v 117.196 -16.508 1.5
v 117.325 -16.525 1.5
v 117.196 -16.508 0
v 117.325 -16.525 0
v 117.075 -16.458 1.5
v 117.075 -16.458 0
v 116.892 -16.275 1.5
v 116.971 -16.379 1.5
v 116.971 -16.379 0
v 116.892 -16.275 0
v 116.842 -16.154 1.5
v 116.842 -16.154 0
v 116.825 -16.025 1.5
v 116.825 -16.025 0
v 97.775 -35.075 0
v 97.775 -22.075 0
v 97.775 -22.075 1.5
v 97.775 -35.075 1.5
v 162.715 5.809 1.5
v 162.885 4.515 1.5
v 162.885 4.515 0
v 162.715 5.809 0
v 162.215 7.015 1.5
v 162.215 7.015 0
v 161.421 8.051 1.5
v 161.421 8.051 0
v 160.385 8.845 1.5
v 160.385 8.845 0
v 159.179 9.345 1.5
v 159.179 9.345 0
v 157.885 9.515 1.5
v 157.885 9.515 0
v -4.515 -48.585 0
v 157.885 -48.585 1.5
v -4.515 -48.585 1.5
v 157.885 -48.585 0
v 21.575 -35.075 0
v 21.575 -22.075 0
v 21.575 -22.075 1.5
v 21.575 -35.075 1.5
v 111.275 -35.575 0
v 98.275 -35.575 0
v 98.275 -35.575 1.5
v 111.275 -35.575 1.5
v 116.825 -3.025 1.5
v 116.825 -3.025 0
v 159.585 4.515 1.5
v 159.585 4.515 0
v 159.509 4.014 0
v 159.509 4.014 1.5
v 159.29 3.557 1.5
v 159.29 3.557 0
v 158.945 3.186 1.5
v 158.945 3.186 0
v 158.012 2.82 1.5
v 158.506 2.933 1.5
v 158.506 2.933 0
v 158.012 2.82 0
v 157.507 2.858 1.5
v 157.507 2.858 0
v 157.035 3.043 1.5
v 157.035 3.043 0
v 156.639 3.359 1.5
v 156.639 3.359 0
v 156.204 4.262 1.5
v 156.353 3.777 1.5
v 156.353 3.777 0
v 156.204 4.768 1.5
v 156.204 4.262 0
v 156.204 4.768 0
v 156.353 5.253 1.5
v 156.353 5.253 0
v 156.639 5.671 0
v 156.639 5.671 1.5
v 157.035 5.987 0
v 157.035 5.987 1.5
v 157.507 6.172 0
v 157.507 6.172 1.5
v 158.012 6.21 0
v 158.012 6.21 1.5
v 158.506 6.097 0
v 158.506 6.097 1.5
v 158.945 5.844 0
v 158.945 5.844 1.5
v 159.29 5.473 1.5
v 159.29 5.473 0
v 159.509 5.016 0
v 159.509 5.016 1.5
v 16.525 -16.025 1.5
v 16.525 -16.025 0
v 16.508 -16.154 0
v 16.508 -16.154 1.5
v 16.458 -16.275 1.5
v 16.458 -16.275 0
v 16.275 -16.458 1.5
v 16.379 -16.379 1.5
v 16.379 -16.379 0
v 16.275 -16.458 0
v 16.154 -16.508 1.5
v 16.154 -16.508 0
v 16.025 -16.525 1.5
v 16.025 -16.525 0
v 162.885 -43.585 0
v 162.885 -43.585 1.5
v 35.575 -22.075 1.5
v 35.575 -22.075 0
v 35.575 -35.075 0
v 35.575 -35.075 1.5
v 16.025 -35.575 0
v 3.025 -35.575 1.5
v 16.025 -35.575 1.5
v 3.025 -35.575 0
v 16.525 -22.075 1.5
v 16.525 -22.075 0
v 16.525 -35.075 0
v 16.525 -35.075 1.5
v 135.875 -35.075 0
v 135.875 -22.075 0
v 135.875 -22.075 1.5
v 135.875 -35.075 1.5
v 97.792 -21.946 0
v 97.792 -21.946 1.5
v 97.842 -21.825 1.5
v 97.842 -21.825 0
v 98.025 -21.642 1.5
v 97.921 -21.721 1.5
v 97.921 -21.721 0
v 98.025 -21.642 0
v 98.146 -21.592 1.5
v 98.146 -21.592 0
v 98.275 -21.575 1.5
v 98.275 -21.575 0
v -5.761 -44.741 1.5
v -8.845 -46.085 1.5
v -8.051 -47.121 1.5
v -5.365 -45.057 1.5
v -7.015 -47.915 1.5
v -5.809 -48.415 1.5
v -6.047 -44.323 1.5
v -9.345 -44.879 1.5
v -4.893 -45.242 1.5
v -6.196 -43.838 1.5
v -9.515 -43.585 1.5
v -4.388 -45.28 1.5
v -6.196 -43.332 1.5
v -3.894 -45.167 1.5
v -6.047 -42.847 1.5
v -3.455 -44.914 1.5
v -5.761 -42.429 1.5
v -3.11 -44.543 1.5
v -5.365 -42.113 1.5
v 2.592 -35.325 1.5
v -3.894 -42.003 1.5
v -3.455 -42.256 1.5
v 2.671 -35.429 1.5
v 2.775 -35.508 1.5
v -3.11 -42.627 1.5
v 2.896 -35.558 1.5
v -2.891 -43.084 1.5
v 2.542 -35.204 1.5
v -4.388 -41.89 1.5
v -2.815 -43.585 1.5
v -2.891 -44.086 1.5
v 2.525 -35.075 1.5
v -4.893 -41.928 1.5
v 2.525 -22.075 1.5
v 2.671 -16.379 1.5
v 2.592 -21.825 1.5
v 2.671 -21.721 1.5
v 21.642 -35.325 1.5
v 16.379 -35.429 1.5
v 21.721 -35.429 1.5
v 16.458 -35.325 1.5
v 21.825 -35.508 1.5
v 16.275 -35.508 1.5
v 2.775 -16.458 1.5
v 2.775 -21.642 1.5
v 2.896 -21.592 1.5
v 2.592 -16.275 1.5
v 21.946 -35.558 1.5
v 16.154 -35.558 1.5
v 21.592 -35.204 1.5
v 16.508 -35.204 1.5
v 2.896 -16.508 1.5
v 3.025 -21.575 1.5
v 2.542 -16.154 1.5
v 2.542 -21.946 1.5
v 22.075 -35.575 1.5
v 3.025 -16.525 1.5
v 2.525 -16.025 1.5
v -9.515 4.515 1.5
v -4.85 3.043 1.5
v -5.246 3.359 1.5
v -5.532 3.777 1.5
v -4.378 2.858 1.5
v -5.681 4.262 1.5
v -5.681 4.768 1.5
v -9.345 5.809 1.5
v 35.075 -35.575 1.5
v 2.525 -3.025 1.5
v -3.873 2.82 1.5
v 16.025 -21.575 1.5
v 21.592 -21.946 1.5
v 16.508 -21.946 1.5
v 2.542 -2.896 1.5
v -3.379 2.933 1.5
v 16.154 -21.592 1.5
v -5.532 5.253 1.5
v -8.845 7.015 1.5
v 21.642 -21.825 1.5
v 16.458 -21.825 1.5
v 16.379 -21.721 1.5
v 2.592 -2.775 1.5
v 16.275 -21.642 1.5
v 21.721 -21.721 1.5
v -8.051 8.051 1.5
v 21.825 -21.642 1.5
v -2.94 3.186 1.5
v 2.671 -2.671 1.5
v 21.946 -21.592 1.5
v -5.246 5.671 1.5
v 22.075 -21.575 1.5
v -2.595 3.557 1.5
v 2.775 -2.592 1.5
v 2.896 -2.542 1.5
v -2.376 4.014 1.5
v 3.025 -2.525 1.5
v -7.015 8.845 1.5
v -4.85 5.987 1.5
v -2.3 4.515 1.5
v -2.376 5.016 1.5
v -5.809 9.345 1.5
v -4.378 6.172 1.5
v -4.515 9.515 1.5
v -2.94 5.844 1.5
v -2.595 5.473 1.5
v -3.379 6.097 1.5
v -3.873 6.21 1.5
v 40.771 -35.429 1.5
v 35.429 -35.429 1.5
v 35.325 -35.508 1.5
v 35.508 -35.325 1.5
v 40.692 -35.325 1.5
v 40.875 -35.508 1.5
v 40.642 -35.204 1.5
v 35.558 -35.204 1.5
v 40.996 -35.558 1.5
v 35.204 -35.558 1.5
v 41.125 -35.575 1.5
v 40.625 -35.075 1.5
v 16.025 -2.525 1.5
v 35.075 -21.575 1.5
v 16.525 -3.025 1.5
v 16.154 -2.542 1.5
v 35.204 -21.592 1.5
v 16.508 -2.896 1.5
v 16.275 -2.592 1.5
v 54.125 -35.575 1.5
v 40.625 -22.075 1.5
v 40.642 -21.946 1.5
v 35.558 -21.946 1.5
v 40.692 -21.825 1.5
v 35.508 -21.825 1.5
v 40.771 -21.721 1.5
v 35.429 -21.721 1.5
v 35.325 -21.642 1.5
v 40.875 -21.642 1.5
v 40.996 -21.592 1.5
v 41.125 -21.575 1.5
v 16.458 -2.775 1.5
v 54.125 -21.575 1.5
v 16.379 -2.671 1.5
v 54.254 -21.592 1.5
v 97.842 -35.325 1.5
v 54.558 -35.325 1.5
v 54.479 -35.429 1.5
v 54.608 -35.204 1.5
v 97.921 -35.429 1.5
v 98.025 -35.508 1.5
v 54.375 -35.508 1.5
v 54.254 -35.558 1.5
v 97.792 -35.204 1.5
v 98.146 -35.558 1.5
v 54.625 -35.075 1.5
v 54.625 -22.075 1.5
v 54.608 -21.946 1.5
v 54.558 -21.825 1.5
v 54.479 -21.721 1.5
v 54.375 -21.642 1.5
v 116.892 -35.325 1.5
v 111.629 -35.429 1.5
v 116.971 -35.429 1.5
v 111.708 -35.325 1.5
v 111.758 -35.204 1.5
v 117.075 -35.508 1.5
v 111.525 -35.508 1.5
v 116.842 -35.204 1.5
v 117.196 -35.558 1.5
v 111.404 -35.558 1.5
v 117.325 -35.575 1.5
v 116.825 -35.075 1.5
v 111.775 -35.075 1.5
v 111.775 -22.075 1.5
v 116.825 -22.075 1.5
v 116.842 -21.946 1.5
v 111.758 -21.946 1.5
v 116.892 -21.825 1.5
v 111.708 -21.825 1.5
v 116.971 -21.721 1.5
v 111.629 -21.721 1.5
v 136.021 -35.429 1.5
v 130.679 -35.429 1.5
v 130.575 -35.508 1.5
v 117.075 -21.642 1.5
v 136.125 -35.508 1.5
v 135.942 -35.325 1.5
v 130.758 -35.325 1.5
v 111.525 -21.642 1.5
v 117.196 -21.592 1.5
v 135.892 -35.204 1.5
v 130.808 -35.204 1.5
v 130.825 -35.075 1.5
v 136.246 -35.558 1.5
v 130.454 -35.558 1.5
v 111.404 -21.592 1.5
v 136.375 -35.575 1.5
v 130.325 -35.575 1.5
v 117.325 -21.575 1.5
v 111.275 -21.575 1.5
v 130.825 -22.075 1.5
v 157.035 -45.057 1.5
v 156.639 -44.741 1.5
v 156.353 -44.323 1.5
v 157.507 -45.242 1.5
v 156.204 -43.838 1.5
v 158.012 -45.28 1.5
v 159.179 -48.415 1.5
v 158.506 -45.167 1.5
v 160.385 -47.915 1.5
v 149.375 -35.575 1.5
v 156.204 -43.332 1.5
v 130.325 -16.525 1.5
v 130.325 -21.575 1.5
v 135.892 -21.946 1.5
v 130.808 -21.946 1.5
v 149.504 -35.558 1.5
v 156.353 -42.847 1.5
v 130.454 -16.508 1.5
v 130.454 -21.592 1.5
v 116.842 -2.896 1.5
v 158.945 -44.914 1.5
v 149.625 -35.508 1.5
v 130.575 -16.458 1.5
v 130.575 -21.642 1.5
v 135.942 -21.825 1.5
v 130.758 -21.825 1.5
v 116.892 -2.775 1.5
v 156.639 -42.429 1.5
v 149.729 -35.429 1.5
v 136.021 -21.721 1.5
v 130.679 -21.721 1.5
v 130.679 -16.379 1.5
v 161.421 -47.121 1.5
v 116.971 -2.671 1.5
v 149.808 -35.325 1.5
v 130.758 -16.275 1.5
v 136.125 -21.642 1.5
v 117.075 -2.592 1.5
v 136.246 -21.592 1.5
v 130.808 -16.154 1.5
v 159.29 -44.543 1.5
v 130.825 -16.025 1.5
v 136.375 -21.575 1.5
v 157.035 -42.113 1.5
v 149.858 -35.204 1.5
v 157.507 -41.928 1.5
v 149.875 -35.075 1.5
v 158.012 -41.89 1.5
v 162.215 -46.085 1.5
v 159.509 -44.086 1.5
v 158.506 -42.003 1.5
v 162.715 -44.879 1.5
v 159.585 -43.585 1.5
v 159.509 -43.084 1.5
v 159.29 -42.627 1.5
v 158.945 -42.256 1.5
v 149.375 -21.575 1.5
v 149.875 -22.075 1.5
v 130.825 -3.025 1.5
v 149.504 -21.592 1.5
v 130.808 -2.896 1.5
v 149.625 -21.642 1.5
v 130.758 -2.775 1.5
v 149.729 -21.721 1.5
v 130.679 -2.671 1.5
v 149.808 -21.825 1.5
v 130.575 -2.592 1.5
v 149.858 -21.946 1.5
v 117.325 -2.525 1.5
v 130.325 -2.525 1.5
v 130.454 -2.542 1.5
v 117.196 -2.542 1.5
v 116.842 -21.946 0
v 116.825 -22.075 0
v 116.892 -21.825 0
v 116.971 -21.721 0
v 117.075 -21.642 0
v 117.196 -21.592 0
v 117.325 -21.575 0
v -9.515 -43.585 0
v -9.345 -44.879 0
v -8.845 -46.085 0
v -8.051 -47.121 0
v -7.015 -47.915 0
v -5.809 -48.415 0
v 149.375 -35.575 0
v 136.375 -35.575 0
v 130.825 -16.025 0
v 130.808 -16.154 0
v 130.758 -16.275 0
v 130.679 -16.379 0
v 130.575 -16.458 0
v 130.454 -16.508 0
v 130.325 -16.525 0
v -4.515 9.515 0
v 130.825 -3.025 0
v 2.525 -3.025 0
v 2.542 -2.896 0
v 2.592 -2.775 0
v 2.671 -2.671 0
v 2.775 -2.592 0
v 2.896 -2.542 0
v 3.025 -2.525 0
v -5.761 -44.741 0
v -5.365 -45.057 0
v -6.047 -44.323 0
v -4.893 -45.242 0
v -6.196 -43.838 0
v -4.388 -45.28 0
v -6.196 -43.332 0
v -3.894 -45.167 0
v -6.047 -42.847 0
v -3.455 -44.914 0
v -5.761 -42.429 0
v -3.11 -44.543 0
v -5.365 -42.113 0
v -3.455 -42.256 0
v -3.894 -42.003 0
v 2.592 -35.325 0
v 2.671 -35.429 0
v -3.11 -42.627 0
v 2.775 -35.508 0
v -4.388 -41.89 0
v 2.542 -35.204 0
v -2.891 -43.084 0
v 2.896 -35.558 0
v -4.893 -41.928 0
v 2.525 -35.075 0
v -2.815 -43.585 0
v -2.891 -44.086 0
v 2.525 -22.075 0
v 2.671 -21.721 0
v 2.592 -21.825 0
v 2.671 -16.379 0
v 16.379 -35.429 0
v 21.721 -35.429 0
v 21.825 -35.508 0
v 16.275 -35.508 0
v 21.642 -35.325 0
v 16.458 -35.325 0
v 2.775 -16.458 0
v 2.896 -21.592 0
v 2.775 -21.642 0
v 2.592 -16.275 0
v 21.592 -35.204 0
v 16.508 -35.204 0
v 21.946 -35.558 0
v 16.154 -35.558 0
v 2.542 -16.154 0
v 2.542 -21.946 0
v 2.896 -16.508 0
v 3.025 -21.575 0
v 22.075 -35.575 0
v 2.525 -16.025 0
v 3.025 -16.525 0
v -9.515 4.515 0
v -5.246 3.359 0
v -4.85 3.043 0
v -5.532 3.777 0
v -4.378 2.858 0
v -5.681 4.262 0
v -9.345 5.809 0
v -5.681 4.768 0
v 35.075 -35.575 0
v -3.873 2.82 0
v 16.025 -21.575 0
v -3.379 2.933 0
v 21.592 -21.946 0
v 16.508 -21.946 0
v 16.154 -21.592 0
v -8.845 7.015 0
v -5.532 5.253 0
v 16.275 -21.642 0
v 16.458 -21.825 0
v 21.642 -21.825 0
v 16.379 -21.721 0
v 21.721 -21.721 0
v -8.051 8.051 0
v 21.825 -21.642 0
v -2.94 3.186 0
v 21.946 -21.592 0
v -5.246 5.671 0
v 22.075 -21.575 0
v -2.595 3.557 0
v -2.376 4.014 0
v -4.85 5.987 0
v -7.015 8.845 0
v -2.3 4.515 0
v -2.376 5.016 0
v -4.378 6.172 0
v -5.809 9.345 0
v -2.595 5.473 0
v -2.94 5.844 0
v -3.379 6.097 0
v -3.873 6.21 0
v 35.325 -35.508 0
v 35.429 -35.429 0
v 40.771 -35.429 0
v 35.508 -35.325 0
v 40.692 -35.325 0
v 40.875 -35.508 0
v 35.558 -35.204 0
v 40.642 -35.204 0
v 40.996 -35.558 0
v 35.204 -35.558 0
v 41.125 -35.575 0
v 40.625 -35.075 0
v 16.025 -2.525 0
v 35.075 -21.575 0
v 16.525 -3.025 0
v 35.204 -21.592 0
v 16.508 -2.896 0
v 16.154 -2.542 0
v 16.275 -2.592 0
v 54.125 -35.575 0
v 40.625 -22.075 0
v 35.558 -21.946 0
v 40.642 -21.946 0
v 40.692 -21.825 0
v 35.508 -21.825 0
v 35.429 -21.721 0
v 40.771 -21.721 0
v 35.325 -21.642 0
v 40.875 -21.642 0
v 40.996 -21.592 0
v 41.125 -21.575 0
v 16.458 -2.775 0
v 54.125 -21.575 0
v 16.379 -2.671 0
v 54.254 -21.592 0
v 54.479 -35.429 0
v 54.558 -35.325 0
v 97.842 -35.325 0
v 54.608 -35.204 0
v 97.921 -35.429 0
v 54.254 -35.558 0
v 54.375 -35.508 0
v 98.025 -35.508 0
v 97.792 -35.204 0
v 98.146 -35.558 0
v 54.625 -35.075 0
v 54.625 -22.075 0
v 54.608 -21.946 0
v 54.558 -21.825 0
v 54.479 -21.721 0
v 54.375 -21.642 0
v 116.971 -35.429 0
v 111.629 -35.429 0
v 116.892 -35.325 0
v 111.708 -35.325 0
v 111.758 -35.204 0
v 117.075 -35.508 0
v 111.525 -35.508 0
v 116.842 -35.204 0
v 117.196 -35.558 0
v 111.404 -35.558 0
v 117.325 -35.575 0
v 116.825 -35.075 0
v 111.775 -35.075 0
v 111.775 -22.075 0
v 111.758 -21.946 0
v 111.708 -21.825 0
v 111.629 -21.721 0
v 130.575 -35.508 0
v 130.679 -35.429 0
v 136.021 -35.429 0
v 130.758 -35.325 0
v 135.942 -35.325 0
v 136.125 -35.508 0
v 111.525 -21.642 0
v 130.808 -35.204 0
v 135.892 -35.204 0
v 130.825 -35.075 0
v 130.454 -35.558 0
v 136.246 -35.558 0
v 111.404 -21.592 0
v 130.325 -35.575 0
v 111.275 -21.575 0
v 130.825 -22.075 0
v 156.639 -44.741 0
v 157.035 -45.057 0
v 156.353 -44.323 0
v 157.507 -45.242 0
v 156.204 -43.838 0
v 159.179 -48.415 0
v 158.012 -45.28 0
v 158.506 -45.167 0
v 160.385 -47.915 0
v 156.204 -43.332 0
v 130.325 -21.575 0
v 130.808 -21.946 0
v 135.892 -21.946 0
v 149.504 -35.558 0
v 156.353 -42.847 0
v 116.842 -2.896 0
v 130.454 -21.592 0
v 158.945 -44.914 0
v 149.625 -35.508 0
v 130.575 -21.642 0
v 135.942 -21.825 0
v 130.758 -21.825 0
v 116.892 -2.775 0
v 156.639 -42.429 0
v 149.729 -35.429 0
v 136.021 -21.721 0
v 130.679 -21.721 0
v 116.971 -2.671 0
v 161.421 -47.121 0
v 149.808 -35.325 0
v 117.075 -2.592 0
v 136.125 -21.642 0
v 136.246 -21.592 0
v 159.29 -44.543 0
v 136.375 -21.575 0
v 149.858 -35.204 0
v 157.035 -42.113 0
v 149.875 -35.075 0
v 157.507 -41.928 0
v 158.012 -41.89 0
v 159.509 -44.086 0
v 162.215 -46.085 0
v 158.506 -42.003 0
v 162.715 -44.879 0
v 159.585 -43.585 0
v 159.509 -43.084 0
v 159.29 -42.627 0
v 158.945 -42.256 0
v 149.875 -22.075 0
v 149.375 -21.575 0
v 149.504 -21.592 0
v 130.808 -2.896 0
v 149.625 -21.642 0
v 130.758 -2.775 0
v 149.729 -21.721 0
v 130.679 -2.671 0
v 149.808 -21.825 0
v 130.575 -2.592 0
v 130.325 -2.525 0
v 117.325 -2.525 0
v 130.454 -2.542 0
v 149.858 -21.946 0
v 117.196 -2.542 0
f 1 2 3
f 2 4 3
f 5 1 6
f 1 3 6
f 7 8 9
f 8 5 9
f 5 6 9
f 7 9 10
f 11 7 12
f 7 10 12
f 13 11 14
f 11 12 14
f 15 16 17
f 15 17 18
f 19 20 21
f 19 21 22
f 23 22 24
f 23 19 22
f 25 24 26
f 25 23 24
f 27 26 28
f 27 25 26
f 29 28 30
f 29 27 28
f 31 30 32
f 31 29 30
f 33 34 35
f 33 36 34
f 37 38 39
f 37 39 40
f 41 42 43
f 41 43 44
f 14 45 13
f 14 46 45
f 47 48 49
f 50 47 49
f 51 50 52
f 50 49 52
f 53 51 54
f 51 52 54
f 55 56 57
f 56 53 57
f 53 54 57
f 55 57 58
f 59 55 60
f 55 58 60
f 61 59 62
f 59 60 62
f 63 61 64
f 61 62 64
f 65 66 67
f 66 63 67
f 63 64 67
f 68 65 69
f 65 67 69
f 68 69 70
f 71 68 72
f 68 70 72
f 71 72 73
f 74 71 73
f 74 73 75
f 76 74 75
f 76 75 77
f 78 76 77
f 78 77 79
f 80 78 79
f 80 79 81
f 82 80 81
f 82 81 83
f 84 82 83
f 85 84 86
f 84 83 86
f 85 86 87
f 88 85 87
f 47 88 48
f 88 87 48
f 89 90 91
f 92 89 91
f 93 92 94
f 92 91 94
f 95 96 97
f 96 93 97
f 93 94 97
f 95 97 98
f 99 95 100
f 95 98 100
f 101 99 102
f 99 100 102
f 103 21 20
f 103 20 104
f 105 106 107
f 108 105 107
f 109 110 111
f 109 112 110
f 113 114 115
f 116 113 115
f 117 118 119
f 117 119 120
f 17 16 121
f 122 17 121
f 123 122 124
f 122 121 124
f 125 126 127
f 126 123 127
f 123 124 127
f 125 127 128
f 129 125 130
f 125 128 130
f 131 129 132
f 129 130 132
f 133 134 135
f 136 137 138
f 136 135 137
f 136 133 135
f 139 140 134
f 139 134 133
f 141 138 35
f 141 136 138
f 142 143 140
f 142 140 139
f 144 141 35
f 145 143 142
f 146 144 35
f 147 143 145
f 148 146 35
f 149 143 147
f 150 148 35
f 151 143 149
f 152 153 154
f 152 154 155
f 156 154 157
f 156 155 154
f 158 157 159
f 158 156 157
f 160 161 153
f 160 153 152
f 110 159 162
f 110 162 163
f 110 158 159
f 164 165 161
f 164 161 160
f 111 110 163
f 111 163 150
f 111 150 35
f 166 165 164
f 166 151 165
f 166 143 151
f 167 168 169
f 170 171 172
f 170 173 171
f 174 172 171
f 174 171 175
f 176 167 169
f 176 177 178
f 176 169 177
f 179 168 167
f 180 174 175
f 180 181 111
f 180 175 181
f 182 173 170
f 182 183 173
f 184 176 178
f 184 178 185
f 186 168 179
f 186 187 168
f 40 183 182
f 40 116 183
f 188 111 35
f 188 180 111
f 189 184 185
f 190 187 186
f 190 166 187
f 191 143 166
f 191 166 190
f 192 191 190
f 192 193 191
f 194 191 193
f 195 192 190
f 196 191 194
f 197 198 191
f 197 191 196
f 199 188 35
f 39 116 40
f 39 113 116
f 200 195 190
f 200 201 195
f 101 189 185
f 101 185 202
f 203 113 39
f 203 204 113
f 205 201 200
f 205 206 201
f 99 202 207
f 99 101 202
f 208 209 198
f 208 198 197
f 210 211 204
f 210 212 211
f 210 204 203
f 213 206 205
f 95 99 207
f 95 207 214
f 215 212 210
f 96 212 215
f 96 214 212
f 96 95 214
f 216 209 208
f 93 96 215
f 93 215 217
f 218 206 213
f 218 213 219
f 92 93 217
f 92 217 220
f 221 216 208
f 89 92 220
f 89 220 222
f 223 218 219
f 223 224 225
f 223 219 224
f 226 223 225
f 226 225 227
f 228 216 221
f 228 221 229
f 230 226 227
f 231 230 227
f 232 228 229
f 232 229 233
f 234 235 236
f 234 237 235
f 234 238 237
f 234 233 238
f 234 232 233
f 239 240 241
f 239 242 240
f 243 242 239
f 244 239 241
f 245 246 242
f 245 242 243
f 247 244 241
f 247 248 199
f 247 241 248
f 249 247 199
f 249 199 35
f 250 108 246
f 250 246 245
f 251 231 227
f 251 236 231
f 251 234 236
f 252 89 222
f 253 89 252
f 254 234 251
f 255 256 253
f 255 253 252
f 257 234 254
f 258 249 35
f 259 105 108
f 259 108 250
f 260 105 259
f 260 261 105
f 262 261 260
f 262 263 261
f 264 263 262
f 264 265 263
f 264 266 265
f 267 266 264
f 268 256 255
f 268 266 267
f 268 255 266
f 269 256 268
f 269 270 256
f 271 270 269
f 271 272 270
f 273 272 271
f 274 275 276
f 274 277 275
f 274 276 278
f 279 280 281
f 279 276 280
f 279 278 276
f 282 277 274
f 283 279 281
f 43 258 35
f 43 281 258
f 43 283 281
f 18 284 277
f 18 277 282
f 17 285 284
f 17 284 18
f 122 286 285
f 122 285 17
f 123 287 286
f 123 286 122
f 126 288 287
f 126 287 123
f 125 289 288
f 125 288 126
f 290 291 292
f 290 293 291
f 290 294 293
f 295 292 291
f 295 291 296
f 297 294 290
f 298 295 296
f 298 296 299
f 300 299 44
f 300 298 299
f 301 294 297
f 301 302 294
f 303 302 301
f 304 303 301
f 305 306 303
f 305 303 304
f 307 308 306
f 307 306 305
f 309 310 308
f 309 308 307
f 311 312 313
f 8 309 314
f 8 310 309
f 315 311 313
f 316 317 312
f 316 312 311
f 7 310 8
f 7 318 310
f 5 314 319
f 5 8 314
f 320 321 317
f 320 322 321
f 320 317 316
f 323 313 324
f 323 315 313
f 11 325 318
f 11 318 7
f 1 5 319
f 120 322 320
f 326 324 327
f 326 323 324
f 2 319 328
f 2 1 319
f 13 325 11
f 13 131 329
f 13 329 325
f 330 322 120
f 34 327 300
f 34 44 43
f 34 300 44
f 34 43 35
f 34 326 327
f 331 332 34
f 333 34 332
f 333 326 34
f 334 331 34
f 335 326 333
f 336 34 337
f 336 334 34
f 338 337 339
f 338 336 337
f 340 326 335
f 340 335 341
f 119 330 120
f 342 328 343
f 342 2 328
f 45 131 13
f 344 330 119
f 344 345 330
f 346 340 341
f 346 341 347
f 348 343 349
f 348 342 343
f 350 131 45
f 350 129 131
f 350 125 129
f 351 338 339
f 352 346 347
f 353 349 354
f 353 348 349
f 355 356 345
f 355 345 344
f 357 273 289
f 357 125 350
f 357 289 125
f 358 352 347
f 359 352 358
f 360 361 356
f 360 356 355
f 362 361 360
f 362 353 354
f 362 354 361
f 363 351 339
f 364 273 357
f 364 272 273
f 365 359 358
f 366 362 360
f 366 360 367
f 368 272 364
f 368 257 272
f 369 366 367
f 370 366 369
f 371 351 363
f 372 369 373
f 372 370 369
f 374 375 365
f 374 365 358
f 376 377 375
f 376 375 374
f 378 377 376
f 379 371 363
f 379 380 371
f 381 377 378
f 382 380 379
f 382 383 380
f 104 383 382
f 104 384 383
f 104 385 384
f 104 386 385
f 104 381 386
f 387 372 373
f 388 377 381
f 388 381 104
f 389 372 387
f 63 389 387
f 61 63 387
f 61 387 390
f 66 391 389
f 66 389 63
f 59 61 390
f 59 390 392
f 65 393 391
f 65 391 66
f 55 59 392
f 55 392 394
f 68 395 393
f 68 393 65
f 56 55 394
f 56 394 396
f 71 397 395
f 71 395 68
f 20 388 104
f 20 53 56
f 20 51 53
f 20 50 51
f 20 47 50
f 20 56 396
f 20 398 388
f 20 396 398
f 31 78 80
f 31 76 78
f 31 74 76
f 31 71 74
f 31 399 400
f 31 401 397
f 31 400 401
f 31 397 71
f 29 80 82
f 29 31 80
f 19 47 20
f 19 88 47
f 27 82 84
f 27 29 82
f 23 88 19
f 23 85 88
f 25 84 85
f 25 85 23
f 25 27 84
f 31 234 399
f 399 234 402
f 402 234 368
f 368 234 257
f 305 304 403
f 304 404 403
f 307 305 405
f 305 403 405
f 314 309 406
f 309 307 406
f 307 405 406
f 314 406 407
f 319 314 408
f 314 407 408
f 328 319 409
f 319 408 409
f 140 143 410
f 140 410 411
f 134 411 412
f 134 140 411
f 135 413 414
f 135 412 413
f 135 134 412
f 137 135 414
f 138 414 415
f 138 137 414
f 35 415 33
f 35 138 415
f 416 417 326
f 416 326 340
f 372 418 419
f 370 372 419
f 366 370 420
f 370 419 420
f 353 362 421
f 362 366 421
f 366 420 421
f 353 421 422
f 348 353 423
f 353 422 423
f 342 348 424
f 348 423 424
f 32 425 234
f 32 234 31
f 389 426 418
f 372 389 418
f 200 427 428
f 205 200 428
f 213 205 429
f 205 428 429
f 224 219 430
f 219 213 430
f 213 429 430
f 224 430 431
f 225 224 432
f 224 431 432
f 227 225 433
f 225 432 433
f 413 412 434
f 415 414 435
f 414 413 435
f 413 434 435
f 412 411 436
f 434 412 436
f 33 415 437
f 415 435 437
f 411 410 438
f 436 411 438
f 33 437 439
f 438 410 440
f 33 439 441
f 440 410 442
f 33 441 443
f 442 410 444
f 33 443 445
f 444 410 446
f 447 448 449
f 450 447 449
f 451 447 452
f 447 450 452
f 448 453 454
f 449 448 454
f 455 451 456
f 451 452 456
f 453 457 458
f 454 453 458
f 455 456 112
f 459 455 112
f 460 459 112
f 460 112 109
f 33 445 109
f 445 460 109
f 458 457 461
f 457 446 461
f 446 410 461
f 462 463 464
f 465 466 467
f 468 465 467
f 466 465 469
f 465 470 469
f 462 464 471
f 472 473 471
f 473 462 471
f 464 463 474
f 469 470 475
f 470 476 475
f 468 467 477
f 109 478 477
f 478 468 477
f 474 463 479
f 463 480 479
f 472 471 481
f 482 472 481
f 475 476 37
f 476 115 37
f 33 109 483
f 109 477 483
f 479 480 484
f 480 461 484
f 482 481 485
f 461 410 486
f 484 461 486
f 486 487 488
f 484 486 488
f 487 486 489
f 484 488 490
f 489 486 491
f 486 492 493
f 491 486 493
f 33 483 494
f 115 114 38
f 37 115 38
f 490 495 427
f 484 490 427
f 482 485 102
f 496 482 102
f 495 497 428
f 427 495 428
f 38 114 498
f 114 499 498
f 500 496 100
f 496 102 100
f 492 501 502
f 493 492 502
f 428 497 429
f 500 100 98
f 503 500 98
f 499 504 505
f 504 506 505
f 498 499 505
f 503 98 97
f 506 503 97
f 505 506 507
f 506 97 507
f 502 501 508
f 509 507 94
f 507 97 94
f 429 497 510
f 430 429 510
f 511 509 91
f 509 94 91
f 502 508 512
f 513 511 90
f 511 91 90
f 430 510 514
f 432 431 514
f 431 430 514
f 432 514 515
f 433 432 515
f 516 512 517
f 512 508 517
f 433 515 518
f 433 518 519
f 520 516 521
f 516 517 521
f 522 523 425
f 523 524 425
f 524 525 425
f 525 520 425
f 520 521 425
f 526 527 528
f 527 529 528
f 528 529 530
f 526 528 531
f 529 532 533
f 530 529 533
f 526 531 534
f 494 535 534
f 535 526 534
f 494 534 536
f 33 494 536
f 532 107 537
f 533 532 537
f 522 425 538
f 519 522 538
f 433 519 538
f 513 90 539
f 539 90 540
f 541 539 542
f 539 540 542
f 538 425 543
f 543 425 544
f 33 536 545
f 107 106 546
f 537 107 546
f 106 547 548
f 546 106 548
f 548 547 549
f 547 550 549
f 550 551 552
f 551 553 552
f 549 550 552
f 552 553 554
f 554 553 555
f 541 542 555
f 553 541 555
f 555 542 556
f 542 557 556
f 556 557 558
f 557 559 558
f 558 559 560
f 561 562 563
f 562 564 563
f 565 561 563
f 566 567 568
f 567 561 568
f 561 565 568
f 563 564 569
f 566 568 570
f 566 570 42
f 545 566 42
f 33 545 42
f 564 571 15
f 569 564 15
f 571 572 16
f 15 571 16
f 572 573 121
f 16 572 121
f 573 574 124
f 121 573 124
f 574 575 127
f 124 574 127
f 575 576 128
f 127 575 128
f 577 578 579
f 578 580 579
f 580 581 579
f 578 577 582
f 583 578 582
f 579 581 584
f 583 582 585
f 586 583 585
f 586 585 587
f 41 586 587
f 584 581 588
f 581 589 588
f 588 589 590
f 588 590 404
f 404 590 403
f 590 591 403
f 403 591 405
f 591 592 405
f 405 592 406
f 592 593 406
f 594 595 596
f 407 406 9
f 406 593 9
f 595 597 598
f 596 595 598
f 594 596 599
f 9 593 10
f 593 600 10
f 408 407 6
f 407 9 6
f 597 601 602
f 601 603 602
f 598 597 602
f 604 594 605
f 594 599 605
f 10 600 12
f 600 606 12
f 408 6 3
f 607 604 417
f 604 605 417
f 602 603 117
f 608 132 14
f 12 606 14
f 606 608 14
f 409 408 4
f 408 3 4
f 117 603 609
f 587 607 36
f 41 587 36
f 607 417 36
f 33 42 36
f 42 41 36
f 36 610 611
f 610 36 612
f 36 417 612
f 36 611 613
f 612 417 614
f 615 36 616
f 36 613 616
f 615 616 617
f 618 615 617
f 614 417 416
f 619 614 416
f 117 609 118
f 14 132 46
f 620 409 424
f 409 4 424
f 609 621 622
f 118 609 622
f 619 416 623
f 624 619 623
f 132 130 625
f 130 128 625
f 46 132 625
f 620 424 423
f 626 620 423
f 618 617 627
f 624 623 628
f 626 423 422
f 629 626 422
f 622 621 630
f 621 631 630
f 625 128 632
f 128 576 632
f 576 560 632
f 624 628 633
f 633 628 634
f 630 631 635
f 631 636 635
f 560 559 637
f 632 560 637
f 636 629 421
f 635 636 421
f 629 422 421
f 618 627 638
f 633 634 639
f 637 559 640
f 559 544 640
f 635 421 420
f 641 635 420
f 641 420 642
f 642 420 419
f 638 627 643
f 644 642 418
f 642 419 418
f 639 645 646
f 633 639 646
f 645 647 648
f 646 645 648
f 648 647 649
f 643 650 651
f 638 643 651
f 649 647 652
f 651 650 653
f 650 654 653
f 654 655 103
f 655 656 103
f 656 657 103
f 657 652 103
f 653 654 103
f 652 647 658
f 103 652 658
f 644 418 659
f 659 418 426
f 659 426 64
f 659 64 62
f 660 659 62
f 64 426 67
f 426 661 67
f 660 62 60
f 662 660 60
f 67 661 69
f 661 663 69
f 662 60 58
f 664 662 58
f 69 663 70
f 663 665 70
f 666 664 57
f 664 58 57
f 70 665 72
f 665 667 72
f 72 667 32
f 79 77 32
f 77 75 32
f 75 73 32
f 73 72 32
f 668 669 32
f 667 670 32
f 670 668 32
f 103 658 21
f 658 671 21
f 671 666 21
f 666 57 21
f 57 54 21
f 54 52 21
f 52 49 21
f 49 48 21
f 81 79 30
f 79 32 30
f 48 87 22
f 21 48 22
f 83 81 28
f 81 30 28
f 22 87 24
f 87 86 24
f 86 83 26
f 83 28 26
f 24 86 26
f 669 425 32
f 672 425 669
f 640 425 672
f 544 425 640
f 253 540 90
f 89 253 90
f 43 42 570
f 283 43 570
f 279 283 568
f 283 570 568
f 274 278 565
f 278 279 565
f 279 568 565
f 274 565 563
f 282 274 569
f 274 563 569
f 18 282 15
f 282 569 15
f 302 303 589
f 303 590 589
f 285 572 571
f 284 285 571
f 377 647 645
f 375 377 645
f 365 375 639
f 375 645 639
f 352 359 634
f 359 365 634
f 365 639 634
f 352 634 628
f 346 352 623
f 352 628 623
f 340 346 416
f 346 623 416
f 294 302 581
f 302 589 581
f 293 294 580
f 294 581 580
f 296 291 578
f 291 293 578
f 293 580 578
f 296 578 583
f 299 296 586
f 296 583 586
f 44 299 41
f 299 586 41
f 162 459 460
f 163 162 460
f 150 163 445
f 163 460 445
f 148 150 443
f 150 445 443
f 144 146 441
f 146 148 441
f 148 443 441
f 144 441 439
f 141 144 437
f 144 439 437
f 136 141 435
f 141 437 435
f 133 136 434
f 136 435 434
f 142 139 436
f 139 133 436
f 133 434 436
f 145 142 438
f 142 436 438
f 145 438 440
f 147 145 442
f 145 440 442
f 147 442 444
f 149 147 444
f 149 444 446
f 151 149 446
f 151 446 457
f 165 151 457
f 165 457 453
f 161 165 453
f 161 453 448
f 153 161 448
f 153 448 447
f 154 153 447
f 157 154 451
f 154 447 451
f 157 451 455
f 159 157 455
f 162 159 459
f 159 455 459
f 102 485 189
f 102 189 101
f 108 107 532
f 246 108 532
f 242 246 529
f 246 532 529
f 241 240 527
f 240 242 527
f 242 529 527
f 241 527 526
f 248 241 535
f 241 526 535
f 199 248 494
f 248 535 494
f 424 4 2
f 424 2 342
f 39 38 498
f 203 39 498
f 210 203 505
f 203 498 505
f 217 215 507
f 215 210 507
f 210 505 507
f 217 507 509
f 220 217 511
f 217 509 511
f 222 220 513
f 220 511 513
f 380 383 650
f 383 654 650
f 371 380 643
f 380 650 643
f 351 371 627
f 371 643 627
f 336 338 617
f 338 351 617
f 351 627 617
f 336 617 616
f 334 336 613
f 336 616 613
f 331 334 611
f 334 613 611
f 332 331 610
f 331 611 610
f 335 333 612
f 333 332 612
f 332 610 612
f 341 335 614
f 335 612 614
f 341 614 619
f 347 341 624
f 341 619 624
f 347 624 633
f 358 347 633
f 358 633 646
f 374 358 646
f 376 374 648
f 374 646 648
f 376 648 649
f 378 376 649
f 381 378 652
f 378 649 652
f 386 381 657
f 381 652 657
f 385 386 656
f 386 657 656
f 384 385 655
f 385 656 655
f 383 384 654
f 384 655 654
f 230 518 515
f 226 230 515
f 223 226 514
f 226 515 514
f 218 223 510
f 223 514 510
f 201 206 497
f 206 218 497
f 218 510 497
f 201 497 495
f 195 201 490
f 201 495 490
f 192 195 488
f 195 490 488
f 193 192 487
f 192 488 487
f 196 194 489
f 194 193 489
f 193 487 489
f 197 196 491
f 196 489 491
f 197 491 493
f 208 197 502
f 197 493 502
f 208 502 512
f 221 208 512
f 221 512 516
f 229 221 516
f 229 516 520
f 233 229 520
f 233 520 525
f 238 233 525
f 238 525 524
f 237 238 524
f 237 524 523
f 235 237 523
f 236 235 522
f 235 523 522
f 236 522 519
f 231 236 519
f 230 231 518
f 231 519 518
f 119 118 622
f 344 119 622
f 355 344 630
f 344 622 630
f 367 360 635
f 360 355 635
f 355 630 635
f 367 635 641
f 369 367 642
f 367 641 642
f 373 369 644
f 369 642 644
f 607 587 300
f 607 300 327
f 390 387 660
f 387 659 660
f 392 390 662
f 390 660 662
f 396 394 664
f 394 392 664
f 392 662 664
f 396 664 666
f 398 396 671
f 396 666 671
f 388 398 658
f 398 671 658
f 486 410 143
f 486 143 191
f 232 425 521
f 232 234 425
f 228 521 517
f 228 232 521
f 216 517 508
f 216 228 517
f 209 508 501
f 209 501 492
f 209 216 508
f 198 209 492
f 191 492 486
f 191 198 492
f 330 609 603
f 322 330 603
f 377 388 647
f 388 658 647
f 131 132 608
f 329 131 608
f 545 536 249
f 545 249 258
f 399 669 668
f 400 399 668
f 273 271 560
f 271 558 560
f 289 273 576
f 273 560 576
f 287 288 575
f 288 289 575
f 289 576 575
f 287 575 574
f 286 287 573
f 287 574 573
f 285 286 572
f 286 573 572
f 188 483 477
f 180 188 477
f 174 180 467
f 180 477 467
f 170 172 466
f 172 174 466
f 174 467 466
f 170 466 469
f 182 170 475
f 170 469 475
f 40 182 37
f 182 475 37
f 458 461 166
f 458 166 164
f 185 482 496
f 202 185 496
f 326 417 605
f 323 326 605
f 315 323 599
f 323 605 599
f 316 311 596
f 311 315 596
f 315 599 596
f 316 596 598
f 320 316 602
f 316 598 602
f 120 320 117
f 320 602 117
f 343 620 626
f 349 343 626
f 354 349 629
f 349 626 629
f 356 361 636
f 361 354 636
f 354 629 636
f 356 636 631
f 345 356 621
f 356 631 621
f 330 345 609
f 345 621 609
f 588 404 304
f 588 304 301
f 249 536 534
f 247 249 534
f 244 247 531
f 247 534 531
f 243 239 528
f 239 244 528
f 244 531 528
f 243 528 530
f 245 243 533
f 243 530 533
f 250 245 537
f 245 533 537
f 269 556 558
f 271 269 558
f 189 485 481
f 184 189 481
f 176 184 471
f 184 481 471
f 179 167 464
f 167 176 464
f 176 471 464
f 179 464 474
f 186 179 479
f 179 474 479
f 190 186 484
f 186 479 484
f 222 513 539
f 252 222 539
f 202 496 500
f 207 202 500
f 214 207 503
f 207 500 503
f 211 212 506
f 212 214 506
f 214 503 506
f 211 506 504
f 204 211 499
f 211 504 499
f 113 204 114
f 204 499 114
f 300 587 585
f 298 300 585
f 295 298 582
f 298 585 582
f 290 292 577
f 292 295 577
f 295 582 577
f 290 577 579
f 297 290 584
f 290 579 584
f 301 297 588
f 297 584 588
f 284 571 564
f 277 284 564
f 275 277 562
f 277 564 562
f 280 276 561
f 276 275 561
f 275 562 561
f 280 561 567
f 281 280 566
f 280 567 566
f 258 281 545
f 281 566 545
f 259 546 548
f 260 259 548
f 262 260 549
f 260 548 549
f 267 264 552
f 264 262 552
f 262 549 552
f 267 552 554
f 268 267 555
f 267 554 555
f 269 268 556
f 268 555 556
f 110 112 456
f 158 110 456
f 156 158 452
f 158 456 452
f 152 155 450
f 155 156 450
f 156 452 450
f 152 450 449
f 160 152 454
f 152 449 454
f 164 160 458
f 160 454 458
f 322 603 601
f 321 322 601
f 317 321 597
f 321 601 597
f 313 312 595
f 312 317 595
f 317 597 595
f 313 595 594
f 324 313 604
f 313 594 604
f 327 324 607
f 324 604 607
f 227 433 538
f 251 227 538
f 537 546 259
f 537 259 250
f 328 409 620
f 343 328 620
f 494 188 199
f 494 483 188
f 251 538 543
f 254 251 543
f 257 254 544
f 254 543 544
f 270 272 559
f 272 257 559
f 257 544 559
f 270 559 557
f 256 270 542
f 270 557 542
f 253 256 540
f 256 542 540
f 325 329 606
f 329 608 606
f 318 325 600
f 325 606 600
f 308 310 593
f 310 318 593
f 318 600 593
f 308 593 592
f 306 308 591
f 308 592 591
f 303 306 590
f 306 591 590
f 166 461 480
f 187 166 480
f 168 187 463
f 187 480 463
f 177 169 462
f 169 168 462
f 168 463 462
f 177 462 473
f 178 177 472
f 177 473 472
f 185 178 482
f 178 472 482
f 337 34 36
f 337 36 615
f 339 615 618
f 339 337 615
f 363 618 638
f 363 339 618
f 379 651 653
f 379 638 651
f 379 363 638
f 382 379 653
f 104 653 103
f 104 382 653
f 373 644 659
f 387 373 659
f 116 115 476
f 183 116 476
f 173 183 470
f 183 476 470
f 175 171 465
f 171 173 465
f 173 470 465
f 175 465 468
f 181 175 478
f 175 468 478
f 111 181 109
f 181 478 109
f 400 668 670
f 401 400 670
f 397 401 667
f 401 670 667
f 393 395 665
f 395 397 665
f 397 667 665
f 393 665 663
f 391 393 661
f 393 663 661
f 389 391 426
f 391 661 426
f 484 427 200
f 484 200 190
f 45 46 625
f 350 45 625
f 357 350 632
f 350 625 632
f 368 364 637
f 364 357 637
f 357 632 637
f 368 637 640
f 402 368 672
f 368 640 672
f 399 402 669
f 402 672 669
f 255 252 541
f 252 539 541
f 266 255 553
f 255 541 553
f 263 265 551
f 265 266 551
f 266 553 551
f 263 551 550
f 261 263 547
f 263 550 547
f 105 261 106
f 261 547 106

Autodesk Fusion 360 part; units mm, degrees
sketch "plate" plane through (0, 0, 0) normal (0, 0, 1) x (1, 0, 0)
  line L0 (3.025, -2.525) -> (16.025, -2.525)
  line L1 (3.025, -16.525) -> (16.025, -16.525)
  line L2 (2.525, -3.025) -> (2.525, -16.025)
  line L3 (16.525, -3.025) -> (16.525, -16.025)
  arc A0 (3.025, -2.525) -> (2.525, -3.025) centre (3.025, -3.025) ccw
  arc A1 (16.525, -3.025) -> (16.025, -2.525) centre (16.025, -3.025) ccw
  arc A2 (2.525, -16.025) -> (3.025, -16.525) centre (3.025, -16.025) ccw
  arc A3 (16.025, -16.525) -> (16.525, -16.025) centre (16.025, -16.025) ccw
  line L4 (117.325, -2.525) -> (130.325, -2.525)
  line L5 (117.325, -16.525) -> (130.325, -16.525)
  line L6 (116.825, -3.025) -> (116.825, -16.025)
  line L7 (130.825, -3.025) -> (130.825, -16.025)
  arc A4 (117.325, -2.525) -> (116.825, -3.025) centre (117.325, -3.025) ccw
  arc A5 (130.825, -3.025) -> (130.325, -2.525) centre (130.325, -3.025) ccw
  arc A6 (116.825, -16.025) -> (117.325, -16.525) centre (117.325, -16.025) ccw
  arc A7 (130.325, -16.525) -> (130.825, -16.025) centre (130.325, -16.025) ccw
  line L8 (3.025, -21.575) -> (16.025, -21.575)
  line L9 (3.025, -35.575) -> (16.025, -35.575)
  line L10 (2.525, -22.075) -> (2.525, -35.075)
  line L11 (16.525, -22.075) -> (16.525, -35.075)
  arc A8 (3.025, -21.575) -> (2.525, -22.075) centre (3.025, -22.075) ccw
  arc A9 (16.525, -22.075) -> (16.025, -21.575) centre (16.025, -22.075) ccw
  arc A10 (2.525, -35.075) -> (3.025, -35.575) centre (3.025, -35.075) ccw
  arc A11 (16.025, -35.575) -> (16.525, -35.075) centre (16.025, -35.075) ccw
  line L12 (22.075, -21.575) -> (35.075, -21.575)
  line L13 (22.075, -35.575) -> (35.075, -35.575)
  line L14 (21.575, -22.075) -> (21.575, -35.075)
  line L15 (35.575, -22.075) -> (35.575, -35.075)
  arc A12 (22.075, -21.575) -> (21.575, -22.075) centre (22.075, -22.075) ccw
  arc A13 (35.575, -22.075) -> (35.075, -21.575) centre (35.075, -22.075) ccw
  arc A14 (21.575, -35.075) -> (22.075, -35.575) centre (22.075, -35.075) ccw
  arc A15 (35.075, -35.575) -> (35.575, -35.075) centre (35.075, -35.075) ccw
  line L16 (41.125, -21.575) -> (54.125, -21.575)
  line L17 (41.125, -35.575) -> (54.125, -35.575)
  line L18 (40.625, -22.075) -> (40.625, -35.075)
  line L19 (54.625, -22.075) -> (54.625, -35.075)
  arc A16 (41.125, -21.575) -> (40.625, -22.075) centre (41.125, -22.075) ccw
  arc A17 (54.625, -22.075) -> (54.125, -21.575) centre (54.125, -22.075) ccw
  arc A18 (40.625, -35.075) -> (41.125, -35.575) centre (41.125, -35.075) ccw
  arc A19 (54.125, -35.575) -> (54.625, -35.075) centre (54.125, -35.075) ccw
  line L20 (98.275, -21.575) -> (111.275, -21.575)
  line L21 (98.275, -35.575) -> (111.275, -35.575)
  line L22 (97.775, -22.075) -> (97.775, -35.075)
  line L23 (111.775, -22.075) -> (111.775, -35.075)
  arc A20 (98.275, -21.575) -> (97.775, -22.075) centre (98.275, -22.075) ccw
  arc A21 (111.775, -22.075) -> (111.275, -21.575) centre (111.275, -22.075) ccw
  arc A22 (97.775, -35.075) -> (98.275, -35.575) centre (98.275, -35.075) ccw
  arc A23 (111.275, -35.575) -> (111.775, -35.075) centre (111.275, -35.075) ccw
  line L24 (117.325, -21.575) -> (130.325, -21.575)
  line L25 (117.325, -35.575) -> (130.325, -35.575)
  line L26 (116.825, -22.075) -> (116.825, -35.075)
  line L27 (130.825, -22.075) -> (130.825, -35.075)
  arc A24 (117.325, -21.575) -> (116.825, -22.075) centre (117.325, -22.075) ccw
  arc A25 (130.825, -22.075) -> (130.325, -21.575) centre (130.325, -22.075) ccw
  arc A26 (116.825, -35.075) -> (117.325, -35.575) centre (117.325, -35.075) ccw
  arc A27 (130.325, -35.575) -> (130.825, -35.075) centre (130.325, -35.075) ccw
  line L28 (136.375, -21.575) -> (149.375, -21.575)
  line L29 (136.375, -35.575) -> (149.375, -35.575)
  line L30 (135.875, -22.075) -> (135.875, -35.075)
  line L31 (149.875, -22.075) -> (149.875, -35.075)
  arc A28 (136.375, -21.575) -> (135.875, -22.075) centre (136.375, -22.075) ccw
  arc A29 (149.875, -22.075) -> (149.375, -21.575) centre (149.375, -22.075) ccw
  arc A30 (135.875, -35.075) -> (136.375, -35.575) centre (136.375, -35.075) ccw
  arc A31 (149.375, -35.575) -> (149.875, -35.075) centre (149.375, -35.075) ccw
  line L32 (-9.515, 9.515) -> (162.885, 9.515)
  line L33 (162.885, 9.515) -> (162.885, -48.585)
  line L34 (162.885, -48.585) -> (-9.515, -48.585)
  line L35 (-9.515, -48.585) -> (-9.515, 9.515)
  circle A32 centre (-4, 4.515) radius 1.7
  circle A33 centre (157.885, 4.515) radius 1.7
  circle A34 centre (157.885, -43.585) radius 1.7
  circle A35 centre (-4.515, -43.585) radius 1.7
  dimension "d1" = 172.4
  dimension "d2" = 58.1
  dimension "d3" = 12.04
  dimension "d4" = 12.04
  dimension "d5" = 3.4
  dimension "d6" = 5
  dimension "d7" = 5.515
  dimension "d8" = 3.4
  dimension "d9" = 5
  dimension "d10" = 5
  dimension "d11" = 3.4
  dimension "d12" = 5
  dimension "d13" = 5
  dimension "d14" = 3.4
  dimension "d15" = 5
  dimension "d16" = 5
extrude "Extrude1" add sketch "plate" along normal blind 1.5
fillet "Fillet1" radius 5 4 edges at (162.885, -48.585, 0.75) (162.885, 9.515, 0.75) (-9.515, 9.515, 0.75) (-9.515, -48.585, 0.75)
